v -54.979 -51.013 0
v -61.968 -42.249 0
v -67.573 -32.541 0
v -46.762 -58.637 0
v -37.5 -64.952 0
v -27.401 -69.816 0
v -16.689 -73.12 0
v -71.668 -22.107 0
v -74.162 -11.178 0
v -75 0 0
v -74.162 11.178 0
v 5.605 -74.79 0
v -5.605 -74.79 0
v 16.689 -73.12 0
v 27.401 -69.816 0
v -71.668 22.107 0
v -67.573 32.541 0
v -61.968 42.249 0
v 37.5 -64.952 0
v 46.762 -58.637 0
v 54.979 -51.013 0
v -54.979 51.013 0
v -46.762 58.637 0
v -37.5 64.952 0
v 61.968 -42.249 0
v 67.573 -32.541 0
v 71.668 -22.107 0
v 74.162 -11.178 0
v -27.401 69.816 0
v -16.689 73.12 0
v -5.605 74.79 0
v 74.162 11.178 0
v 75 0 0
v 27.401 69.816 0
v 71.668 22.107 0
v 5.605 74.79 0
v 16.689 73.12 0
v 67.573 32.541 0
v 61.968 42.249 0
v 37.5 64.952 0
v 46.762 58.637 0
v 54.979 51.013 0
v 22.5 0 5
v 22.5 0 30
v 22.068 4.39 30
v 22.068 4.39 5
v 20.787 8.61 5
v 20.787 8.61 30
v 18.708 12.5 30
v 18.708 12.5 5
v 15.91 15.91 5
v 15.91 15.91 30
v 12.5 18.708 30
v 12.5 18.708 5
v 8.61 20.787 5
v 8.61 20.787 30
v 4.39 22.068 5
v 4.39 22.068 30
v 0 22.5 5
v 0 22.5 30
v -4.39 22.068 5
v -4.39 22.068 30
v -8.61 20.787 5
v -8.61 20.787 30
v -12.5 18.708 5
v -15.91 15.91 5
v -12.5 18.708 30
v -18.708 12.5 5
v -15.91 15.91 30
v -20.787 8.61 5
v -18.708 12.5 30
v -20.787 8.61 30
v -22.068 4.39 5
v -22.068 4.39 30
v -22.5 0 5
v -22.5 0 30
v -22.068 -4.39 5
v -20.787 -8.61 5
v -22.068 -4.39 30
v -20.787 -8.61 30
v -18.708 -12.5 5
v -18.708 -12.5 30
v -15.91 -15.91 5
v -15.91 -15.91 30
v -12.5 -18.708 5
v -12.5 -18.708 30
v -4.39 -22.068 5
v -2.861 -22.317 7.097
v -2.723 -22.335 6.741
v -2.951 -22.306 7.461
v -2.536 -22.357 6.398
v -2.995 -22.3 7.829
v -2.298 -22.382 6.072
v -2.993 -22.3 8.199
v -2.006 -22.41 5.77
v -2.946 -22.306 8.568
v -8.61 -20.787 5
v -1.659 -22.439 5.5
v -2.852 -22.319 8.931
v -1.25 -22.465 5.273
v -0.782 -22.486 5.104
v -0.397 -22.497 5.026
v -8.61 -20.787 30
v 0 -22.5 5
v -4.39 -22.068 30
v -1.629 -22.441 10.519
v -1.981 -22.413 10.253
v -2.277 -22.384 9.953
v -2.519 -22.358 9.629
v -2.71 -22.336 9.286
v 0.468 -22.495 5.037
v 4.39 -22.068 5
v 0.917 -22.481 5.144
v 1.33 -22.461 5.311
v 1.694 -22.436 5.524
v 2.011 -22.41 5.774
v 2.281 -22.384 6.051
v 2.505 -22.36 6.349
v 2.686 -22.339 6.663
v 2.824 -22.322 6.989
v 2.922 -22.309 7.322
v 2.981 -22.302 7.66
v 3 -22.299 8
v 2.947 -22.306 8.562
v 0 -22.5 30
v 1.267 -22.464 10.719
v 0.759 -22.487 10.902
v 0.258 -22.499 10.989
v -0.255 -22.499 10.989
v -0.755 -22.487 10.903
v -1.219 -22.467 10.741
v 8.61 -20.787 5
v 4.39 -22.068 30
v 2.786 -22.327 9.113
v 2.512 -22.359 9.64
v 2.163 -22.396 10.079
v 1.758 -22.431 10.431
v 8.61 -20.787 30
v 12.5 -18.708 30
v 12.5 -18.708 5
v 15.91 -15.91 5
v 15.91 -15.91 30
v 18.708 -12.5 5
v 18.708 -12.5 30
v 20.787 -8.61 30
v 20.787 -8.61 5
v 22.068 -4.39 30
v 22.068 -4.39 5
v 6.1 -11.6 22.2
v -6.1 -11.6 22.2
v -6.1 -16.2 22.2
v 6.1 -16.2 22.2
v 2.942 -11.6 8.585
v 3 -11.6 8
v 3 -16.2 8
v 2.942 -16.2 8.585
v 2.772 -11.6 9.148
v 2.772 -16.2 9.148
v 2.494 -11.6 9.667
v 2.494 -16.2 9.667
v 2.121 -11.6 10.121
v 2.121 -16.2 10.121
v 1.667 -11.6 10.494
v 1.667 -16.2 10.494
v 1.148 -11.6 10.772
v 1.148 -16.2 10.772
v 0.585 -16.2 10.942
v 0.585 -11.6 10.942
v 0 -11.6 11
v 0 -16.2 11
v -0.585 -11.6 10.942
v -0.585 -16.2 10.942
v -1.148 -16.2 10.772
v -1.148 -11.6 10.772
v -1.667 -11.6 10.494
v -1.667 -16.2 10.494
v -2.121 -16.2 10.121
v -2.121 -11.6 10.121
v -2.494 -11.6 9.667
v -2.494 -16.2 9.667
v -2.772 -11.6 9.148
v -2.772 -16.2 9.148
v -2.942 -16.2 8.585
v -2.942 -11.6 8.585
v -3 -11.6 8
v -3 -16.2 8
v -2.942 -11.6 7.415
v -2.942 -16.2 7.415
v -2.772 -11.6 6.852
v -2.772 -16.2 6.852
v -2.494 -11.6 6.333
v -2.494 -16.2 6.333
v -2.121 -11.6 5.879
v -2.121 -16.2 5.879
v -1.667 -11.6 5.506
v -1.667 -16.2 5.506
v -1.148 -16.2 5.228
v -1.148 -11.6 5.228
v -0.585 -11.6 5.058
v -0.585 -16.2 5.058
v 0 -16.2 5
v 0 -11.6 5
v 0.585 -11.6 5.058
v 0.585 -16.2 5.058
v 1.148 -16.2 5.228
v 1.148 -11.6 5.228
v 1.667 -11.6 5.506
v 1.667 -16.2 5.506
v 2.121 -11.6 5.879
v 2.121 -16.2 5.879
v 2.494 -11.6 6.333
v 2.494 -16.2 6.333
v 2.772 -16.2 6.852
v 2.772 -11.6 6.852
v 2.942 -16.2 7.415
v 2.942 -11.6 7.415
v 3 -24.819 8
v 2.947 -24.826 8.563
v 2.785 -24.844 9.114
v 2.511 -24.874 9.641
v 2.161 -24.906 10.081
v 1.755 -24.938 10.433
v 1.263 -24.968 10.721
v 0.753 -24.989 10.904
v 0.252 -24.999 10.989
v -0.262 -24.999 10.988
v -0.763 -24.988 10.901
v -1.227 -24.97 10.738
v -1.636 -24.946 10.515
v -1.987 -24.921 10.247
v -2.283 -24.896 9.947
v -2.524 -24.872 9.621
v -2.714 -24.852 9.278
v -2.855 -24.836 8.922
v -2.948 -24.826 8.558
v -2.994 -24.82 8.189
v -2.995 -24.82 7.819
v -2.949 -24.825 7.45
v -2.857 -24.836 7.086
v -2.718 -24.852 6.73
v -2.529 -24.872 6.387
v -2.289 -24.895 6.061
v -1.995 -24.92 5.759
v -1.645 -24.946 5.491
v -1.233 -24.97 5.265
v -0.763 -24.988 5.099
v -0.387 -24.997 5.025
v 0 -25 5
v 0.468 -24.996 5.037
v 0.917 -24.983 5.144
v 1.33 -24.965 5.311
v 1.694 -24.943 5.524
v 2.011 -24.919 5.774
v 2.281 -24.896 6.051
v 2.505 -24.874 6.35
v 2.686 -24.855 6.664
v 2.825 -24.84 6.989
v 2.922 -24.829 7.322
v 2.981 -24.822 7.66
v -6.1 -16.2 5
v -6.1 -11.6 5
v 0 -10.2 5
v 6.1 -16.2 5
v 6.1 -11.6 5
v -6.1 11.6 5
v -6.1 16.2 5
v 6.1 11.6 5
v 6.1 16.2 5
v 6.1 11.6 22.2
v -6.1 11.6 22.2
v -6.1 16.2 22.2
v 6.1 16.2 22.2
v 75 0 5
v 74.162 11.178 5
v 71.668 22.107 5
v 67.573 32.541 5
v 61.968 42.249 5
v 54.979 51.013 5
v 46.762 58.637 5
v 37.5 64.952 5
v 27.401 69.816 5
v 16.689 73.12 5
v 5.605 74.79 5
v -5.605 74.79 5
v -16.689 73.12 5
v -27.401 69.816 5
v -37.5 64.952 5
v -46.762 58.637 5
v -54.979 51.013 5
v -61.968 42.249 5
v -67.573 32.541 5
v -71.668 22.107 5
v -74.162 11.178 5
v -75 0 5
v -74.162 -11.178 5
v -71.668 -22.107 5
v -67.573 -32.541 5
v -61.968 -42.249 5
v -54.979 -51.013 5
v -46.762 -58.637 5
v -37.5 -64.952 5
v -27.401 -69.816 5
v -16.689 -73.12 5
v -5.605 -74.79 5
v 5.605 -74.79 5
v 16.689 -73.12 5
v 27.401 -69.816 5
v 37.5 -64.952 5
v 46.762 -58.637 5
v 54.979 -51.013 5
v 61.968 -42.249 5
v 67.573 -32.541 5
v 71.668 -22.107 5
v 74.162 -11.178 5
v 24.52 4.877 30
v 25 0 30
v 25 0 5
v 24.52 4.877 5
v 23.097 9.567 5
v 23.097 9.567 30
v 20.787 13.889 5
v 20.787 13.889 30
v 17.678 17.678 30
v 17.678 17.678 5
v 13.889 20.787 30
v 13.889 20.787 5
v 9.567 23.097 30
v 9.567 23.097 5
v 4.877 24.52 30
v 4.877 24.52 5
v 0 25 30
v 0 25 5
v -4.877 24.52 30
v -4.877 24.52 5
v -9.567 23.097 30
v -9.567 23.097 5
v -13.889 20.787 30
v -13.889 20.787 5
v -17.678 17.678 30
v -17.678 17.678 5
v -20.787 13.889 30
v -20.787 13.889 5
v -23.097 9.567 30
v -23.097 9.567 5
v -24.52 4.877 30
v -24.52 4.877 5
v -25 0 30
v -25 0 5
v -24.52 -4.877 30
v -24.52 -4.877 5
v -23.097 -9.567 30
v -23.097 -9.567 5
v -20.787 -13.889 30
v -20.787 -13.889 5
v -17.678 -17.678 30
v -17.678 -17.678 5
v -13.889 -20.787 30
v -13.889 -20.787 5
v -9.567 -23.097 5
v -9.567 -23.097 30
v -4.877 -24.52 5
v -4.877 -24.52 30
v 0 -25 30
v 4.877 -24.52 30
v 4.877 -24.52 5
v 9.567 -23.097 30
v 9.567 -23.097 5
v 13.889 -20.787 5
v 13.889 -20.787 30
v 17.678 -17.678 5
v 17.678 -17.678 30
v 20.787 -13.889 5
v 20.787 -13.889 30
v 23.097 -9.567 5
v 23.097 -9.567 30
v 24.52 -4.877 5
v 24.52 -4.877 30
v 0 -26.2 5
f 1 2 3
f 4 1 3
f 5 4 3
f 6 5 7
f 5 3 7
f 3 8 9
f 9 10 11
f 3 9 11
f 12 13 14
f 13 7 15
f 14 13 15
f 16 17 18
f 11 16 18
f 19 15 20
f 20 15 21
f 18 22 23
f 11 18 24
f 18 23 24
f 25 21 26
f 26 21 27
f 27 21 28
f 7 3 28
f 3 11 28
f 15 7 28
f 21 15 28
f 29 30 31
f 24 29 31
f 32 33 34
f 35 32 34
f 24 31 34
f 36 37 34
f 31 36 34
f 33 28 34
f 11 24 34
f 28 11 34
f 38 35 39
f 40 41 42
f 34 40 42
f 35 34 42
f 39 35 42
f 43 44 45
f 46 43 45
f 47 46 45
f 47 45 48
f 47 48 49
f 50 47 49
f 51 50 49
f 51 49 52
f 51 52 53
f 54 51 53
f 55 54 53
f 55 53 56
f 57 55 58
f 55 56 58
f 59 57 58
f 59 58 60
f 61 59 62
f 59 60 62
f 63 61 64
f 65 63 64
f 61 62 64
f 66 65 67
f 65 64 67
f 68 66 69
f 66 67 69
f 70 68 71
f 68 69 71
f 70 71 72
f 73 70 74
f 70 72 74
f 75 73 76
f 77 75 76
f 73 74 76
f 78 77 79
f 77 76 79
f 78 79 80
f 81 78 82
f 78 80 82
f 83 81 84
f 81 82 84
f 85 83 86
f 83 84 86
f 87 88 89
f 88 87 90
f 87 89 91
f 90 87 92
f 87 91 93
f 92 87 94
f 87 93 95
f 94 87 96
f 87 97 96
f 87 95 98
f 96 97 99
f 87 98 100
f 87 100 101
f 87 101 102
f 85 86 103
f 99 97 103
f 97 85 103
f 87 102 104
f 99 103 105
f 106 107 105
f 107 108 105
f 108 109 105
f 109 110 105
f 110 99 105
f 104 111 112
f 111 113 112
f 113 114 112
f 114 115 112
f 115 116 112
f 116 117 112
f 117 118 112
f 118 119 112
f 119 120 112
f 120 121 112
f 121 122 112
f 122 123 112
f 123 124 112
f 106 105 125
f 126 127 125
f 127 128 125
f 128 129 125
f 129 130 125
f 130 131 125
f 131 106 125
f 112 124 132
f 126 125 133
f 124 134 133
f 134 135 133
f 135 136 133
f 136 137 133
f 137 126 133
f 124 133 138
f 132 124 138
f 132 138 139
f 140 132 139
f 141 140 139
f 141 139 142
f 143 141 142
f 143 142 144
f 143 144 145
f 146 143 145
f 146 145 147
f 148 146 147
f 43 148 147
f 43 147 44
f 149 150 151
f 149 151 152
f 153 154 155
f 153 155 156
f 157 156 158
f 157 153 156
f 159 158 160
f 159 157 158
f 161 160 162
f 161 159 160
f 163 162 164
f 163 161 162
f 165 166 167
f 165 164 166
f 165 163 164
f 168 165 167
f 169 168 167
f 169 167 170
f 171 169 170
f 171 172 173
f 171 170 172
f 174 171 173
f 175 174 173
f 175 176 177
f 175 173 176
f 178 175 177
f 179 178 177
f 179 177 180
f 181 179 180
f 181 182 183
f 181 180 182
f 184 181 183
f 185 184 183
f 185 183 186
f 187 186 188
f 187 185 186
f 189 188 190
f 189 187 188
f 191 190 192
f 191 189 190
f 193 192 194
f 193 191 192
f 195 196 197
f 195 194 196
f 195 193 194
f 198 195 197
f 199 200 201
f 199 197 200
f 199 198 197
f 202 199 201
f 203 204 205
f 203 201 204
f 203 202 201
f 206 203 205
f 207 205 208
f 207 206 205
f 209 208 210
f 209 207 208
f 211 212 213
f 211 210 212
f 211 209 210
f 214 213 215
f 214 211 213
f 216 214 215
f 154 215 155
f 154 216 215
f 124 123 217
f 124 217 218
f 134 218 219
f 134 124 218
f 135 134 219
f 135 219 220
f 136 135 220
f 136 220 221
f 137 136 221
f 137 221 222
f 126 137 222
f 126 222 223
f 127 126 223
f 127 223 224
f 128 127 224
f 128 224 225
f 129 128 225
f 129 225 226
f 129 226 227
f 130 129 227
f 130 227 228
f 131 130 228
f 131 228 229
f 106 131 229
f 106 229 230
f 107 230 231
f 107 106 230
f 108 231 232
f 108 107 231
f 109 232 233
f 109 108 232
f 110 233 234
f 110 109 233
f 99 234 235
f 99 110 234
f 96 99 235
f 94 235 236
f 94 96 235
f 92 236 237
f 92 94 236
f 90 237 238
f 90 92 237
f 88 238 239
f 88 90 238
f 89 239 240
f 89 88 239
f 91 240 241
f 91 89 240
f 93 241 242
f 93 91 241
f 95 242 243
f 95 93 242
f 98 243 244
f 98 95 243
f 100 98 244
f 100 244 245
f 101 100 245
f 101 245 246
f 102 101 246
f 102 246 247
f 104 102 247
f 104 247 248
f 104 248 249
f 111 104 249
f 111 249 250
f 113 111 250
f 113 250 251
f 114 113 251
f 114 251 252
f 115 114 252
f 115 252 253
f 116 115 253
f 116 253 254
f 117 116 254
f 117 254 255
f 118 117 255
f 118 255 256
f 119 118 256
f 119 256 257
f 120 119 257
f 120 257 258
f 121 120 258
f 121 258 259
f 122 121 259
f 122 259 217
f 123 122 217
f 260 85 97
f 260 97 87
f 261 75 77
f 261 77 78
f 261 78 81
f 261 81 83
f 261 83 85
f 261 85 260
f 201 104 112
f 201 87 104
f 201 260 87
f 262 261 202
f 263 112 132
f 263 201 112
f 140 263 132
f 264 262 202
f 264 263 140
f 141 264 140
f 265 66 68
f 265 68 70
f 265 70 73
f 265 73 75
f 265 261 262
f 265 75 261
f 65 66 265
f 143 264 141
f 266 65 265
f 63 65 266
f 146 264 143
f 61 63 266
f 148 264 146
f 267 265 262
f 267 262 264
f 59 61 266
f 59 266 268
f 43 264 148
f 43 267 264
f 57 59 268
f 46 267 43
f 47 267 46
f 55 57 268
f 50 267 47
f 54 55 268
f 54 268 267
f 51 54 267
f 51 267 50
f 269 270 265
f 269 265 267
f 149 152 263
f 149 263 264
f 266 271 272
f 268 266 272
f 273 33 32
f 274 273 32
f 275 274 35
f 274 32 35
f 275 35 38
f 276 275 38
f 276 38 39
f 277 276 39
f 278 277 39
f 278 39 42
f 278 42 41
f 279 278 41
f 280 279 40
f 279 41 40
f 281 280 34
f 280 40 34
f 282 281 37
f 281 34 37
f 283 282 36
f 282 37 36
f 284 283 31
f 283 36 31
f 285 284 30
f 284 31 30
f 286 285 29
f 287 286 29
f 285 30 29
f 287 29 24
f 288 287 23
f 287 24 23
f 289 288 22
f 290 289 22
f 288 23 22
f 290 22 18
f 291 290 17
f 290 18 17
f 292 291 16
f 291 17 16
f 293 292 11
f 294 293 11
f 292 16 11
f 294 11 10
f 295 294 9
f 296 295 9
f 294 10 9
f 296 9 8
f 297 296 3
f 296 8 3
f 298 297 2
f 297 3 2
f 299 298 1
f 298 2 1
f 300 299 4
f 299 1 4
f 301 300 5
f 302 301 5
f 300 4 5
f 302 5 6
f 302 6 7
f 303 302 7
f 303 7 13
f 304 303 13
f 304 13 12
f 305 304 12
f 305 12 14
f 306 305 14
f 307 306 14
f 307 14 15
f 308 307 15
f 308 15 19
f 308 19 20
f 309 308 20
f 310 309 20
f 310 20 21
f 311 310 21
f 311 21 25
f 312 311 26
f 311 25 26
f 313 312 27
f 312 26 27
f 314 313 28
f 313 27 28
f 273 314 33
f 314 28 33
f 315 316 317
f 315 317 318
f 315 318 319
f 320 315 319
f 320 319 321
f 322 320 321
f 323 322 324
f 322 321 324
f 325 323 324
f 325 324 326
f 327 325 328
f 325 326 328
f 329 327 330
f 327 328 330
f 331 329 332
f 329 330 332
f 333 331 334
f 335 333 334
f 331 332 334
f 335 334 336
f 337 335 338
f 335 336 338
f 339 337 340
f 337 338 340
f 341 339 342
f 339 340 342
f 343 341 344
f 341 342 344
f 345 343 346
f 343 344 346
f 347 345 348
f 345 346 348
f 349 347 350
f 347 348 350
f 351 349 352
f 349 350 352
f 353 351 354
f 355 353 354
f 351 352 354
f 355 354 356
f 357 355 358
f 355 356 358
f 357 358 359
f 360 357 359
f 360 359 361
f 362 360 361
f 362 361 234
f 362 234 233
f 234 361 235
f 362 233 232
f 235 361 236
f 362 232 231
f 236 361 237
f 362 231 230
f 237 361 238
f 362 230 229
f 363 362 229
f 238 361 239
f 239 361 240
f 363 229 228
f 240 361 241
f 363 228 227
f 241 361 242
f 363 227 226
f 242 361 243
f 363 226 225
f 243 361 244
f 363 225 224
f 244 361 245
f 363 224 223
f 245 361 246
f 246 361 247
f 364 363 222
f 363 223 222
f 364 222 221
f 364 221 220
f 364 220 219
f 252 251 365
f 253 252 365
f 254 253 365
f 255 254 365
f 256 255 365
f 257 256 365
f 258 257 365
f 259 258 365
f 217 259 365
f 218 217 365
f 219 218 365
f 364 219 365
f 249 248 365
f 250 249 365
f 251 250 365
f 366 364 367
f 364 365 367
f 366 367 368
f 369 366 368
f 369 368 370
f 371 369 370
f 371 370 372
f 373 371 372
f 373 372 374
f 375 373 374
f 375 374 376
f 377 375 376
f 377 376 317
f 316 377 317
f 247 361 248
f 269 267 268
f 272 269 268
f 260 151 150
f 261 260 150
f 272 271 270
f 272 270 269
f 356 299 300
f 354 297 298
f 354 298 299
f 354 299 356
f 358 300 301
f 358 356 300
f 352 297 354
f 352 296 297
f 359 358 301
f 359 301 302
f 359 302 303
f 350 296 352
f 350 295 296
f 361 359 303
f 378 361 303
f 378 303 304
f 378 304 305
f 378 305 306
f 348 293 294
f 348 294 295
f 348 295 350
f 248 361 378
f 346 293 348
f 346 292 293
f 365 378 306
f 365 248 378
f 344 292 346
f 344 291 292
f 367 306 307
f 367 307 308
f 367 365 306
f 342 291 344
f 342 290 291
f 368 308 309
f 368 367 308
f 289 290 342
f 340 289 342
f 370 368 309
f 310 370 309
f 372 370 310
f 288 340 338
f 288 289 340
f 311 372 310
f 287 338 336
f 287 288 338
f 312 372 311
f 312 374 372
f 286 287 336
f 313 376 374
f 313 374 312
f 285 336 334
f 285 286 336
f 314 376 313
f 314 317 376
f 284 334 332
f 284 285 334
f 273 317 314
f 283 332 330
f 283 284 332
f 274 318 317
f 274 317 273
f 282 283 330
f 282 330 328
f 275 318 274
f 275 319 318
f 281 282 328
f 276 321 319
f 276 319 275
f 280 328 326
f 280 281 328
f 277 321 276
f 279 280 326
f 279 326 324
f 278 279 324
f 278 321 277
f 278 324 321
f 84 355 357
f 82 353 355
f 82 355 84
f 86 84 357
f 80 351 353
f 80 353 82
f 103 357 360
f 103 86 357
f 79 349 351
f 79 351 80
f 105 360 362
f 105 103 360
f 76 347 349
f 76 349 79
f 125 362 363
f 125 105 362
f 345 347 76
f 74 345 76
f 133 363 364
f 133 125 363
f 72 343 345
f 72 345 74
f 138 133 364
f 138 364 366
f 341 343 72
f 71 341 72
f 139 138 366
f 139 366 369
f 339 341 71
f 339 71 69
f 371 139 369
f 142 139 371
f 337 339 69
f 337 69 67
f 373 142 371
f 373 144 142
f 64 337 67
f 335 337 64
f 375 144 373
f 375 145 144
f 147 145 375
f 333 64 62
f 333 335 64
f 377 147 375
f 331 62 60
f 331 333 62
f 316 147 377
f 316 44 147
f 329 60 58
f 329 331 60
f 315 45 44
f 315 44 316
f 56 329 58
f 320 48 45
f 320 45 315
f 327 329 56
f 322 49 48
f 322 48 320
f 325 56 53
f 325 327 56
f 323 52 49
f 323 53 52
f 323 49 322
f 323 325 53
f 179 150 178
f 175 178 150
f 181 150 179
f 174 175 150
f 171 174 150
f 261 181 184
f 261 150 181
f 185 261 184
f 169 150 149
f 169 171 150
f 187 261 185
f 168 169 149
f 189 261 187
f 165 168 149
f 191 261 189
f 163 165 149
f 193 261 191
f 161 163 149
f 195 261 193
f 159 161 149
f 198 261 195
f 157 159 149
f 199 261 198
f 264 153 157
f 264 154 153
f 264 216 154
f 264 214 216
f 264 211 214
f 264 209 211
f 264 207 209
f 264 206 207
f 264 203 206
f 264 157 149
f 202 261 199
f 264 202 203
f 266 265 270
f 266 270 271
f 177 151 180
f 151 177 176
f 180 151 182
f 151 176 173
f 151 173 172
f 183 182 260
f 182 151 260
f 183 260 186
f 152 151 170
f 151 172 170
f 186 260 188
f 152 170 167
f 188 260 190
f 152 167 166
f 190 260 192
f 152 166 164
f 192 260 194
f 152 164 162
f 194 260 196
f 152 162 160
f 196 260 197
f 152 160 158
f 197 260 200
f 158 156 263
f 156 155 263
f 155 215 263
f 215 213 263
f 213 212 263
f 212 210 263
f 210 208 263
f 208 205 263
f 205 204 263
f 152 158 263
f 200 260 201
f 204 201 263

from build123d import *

# Parameters (mm, degrees)
SKETCH_R       = 75
PAD_DEPTH      = 5
SKETCH001_R    = 25
PAD001_DEPTH   = 25
SKETCH002_R    = 22.5
POCKET_DEPTH   = 25
SKETCH003_W    = 12.2
SKETCH003_H    = 4.6
PAD002_DEPTH   = 17.2
CYLINDER_R     = 3
CYLINDER_DEPTH = 16


with BuildPart() as part:
    # Sketch → Pad (new body)
    with BuildSketch(Plane.XY):
        Circle(SKETCH_R)
    extrude(amount=PAD_DEPTH)

    # Sketch001 (on Face3 of Pad) → Pad001 (join)
    with BuildSketch(Plane.XY.offset(5)):
        Circle(SKETCH001_R)
    extrude(amount=PAD001_DEPTH)

    # Sketch002 (on Face5 of Pad001) → Pocket (cut)
    with BuildSketch(Plane.XY.offset(30)):
        Circle(SKETCH002_R)
    extrude(amount=-POCKET_DEPTH, mode=Mode.SUBTRACT)

    # Sketch003 (on Face7 of Pocket) → Pad002 (join)
    with BuildSketch(Plane.XY.offset(5)):
        with Locations((0, 13.9)):
            Rectangle(SKETCH003_W, SKETCH003_H)
        with Locations((0, -13.9)):
            Rectangle(SKETCH003_W, SKETCH003_H)
    extrude(amount=PAD002_DEPTH)

    # Cylinder → Cylinder (cut)
    with BuildSketch(Plane(origin=(0, -10.2, 8), x_dir=(1, 0, 0), z_dir=(0, -1, 0))):
        Circle(CYLINDER_R)
    extrude(amount=CYLINDER_DEPTH, mode=Mode.SUBTRACT)


solid = part.part
